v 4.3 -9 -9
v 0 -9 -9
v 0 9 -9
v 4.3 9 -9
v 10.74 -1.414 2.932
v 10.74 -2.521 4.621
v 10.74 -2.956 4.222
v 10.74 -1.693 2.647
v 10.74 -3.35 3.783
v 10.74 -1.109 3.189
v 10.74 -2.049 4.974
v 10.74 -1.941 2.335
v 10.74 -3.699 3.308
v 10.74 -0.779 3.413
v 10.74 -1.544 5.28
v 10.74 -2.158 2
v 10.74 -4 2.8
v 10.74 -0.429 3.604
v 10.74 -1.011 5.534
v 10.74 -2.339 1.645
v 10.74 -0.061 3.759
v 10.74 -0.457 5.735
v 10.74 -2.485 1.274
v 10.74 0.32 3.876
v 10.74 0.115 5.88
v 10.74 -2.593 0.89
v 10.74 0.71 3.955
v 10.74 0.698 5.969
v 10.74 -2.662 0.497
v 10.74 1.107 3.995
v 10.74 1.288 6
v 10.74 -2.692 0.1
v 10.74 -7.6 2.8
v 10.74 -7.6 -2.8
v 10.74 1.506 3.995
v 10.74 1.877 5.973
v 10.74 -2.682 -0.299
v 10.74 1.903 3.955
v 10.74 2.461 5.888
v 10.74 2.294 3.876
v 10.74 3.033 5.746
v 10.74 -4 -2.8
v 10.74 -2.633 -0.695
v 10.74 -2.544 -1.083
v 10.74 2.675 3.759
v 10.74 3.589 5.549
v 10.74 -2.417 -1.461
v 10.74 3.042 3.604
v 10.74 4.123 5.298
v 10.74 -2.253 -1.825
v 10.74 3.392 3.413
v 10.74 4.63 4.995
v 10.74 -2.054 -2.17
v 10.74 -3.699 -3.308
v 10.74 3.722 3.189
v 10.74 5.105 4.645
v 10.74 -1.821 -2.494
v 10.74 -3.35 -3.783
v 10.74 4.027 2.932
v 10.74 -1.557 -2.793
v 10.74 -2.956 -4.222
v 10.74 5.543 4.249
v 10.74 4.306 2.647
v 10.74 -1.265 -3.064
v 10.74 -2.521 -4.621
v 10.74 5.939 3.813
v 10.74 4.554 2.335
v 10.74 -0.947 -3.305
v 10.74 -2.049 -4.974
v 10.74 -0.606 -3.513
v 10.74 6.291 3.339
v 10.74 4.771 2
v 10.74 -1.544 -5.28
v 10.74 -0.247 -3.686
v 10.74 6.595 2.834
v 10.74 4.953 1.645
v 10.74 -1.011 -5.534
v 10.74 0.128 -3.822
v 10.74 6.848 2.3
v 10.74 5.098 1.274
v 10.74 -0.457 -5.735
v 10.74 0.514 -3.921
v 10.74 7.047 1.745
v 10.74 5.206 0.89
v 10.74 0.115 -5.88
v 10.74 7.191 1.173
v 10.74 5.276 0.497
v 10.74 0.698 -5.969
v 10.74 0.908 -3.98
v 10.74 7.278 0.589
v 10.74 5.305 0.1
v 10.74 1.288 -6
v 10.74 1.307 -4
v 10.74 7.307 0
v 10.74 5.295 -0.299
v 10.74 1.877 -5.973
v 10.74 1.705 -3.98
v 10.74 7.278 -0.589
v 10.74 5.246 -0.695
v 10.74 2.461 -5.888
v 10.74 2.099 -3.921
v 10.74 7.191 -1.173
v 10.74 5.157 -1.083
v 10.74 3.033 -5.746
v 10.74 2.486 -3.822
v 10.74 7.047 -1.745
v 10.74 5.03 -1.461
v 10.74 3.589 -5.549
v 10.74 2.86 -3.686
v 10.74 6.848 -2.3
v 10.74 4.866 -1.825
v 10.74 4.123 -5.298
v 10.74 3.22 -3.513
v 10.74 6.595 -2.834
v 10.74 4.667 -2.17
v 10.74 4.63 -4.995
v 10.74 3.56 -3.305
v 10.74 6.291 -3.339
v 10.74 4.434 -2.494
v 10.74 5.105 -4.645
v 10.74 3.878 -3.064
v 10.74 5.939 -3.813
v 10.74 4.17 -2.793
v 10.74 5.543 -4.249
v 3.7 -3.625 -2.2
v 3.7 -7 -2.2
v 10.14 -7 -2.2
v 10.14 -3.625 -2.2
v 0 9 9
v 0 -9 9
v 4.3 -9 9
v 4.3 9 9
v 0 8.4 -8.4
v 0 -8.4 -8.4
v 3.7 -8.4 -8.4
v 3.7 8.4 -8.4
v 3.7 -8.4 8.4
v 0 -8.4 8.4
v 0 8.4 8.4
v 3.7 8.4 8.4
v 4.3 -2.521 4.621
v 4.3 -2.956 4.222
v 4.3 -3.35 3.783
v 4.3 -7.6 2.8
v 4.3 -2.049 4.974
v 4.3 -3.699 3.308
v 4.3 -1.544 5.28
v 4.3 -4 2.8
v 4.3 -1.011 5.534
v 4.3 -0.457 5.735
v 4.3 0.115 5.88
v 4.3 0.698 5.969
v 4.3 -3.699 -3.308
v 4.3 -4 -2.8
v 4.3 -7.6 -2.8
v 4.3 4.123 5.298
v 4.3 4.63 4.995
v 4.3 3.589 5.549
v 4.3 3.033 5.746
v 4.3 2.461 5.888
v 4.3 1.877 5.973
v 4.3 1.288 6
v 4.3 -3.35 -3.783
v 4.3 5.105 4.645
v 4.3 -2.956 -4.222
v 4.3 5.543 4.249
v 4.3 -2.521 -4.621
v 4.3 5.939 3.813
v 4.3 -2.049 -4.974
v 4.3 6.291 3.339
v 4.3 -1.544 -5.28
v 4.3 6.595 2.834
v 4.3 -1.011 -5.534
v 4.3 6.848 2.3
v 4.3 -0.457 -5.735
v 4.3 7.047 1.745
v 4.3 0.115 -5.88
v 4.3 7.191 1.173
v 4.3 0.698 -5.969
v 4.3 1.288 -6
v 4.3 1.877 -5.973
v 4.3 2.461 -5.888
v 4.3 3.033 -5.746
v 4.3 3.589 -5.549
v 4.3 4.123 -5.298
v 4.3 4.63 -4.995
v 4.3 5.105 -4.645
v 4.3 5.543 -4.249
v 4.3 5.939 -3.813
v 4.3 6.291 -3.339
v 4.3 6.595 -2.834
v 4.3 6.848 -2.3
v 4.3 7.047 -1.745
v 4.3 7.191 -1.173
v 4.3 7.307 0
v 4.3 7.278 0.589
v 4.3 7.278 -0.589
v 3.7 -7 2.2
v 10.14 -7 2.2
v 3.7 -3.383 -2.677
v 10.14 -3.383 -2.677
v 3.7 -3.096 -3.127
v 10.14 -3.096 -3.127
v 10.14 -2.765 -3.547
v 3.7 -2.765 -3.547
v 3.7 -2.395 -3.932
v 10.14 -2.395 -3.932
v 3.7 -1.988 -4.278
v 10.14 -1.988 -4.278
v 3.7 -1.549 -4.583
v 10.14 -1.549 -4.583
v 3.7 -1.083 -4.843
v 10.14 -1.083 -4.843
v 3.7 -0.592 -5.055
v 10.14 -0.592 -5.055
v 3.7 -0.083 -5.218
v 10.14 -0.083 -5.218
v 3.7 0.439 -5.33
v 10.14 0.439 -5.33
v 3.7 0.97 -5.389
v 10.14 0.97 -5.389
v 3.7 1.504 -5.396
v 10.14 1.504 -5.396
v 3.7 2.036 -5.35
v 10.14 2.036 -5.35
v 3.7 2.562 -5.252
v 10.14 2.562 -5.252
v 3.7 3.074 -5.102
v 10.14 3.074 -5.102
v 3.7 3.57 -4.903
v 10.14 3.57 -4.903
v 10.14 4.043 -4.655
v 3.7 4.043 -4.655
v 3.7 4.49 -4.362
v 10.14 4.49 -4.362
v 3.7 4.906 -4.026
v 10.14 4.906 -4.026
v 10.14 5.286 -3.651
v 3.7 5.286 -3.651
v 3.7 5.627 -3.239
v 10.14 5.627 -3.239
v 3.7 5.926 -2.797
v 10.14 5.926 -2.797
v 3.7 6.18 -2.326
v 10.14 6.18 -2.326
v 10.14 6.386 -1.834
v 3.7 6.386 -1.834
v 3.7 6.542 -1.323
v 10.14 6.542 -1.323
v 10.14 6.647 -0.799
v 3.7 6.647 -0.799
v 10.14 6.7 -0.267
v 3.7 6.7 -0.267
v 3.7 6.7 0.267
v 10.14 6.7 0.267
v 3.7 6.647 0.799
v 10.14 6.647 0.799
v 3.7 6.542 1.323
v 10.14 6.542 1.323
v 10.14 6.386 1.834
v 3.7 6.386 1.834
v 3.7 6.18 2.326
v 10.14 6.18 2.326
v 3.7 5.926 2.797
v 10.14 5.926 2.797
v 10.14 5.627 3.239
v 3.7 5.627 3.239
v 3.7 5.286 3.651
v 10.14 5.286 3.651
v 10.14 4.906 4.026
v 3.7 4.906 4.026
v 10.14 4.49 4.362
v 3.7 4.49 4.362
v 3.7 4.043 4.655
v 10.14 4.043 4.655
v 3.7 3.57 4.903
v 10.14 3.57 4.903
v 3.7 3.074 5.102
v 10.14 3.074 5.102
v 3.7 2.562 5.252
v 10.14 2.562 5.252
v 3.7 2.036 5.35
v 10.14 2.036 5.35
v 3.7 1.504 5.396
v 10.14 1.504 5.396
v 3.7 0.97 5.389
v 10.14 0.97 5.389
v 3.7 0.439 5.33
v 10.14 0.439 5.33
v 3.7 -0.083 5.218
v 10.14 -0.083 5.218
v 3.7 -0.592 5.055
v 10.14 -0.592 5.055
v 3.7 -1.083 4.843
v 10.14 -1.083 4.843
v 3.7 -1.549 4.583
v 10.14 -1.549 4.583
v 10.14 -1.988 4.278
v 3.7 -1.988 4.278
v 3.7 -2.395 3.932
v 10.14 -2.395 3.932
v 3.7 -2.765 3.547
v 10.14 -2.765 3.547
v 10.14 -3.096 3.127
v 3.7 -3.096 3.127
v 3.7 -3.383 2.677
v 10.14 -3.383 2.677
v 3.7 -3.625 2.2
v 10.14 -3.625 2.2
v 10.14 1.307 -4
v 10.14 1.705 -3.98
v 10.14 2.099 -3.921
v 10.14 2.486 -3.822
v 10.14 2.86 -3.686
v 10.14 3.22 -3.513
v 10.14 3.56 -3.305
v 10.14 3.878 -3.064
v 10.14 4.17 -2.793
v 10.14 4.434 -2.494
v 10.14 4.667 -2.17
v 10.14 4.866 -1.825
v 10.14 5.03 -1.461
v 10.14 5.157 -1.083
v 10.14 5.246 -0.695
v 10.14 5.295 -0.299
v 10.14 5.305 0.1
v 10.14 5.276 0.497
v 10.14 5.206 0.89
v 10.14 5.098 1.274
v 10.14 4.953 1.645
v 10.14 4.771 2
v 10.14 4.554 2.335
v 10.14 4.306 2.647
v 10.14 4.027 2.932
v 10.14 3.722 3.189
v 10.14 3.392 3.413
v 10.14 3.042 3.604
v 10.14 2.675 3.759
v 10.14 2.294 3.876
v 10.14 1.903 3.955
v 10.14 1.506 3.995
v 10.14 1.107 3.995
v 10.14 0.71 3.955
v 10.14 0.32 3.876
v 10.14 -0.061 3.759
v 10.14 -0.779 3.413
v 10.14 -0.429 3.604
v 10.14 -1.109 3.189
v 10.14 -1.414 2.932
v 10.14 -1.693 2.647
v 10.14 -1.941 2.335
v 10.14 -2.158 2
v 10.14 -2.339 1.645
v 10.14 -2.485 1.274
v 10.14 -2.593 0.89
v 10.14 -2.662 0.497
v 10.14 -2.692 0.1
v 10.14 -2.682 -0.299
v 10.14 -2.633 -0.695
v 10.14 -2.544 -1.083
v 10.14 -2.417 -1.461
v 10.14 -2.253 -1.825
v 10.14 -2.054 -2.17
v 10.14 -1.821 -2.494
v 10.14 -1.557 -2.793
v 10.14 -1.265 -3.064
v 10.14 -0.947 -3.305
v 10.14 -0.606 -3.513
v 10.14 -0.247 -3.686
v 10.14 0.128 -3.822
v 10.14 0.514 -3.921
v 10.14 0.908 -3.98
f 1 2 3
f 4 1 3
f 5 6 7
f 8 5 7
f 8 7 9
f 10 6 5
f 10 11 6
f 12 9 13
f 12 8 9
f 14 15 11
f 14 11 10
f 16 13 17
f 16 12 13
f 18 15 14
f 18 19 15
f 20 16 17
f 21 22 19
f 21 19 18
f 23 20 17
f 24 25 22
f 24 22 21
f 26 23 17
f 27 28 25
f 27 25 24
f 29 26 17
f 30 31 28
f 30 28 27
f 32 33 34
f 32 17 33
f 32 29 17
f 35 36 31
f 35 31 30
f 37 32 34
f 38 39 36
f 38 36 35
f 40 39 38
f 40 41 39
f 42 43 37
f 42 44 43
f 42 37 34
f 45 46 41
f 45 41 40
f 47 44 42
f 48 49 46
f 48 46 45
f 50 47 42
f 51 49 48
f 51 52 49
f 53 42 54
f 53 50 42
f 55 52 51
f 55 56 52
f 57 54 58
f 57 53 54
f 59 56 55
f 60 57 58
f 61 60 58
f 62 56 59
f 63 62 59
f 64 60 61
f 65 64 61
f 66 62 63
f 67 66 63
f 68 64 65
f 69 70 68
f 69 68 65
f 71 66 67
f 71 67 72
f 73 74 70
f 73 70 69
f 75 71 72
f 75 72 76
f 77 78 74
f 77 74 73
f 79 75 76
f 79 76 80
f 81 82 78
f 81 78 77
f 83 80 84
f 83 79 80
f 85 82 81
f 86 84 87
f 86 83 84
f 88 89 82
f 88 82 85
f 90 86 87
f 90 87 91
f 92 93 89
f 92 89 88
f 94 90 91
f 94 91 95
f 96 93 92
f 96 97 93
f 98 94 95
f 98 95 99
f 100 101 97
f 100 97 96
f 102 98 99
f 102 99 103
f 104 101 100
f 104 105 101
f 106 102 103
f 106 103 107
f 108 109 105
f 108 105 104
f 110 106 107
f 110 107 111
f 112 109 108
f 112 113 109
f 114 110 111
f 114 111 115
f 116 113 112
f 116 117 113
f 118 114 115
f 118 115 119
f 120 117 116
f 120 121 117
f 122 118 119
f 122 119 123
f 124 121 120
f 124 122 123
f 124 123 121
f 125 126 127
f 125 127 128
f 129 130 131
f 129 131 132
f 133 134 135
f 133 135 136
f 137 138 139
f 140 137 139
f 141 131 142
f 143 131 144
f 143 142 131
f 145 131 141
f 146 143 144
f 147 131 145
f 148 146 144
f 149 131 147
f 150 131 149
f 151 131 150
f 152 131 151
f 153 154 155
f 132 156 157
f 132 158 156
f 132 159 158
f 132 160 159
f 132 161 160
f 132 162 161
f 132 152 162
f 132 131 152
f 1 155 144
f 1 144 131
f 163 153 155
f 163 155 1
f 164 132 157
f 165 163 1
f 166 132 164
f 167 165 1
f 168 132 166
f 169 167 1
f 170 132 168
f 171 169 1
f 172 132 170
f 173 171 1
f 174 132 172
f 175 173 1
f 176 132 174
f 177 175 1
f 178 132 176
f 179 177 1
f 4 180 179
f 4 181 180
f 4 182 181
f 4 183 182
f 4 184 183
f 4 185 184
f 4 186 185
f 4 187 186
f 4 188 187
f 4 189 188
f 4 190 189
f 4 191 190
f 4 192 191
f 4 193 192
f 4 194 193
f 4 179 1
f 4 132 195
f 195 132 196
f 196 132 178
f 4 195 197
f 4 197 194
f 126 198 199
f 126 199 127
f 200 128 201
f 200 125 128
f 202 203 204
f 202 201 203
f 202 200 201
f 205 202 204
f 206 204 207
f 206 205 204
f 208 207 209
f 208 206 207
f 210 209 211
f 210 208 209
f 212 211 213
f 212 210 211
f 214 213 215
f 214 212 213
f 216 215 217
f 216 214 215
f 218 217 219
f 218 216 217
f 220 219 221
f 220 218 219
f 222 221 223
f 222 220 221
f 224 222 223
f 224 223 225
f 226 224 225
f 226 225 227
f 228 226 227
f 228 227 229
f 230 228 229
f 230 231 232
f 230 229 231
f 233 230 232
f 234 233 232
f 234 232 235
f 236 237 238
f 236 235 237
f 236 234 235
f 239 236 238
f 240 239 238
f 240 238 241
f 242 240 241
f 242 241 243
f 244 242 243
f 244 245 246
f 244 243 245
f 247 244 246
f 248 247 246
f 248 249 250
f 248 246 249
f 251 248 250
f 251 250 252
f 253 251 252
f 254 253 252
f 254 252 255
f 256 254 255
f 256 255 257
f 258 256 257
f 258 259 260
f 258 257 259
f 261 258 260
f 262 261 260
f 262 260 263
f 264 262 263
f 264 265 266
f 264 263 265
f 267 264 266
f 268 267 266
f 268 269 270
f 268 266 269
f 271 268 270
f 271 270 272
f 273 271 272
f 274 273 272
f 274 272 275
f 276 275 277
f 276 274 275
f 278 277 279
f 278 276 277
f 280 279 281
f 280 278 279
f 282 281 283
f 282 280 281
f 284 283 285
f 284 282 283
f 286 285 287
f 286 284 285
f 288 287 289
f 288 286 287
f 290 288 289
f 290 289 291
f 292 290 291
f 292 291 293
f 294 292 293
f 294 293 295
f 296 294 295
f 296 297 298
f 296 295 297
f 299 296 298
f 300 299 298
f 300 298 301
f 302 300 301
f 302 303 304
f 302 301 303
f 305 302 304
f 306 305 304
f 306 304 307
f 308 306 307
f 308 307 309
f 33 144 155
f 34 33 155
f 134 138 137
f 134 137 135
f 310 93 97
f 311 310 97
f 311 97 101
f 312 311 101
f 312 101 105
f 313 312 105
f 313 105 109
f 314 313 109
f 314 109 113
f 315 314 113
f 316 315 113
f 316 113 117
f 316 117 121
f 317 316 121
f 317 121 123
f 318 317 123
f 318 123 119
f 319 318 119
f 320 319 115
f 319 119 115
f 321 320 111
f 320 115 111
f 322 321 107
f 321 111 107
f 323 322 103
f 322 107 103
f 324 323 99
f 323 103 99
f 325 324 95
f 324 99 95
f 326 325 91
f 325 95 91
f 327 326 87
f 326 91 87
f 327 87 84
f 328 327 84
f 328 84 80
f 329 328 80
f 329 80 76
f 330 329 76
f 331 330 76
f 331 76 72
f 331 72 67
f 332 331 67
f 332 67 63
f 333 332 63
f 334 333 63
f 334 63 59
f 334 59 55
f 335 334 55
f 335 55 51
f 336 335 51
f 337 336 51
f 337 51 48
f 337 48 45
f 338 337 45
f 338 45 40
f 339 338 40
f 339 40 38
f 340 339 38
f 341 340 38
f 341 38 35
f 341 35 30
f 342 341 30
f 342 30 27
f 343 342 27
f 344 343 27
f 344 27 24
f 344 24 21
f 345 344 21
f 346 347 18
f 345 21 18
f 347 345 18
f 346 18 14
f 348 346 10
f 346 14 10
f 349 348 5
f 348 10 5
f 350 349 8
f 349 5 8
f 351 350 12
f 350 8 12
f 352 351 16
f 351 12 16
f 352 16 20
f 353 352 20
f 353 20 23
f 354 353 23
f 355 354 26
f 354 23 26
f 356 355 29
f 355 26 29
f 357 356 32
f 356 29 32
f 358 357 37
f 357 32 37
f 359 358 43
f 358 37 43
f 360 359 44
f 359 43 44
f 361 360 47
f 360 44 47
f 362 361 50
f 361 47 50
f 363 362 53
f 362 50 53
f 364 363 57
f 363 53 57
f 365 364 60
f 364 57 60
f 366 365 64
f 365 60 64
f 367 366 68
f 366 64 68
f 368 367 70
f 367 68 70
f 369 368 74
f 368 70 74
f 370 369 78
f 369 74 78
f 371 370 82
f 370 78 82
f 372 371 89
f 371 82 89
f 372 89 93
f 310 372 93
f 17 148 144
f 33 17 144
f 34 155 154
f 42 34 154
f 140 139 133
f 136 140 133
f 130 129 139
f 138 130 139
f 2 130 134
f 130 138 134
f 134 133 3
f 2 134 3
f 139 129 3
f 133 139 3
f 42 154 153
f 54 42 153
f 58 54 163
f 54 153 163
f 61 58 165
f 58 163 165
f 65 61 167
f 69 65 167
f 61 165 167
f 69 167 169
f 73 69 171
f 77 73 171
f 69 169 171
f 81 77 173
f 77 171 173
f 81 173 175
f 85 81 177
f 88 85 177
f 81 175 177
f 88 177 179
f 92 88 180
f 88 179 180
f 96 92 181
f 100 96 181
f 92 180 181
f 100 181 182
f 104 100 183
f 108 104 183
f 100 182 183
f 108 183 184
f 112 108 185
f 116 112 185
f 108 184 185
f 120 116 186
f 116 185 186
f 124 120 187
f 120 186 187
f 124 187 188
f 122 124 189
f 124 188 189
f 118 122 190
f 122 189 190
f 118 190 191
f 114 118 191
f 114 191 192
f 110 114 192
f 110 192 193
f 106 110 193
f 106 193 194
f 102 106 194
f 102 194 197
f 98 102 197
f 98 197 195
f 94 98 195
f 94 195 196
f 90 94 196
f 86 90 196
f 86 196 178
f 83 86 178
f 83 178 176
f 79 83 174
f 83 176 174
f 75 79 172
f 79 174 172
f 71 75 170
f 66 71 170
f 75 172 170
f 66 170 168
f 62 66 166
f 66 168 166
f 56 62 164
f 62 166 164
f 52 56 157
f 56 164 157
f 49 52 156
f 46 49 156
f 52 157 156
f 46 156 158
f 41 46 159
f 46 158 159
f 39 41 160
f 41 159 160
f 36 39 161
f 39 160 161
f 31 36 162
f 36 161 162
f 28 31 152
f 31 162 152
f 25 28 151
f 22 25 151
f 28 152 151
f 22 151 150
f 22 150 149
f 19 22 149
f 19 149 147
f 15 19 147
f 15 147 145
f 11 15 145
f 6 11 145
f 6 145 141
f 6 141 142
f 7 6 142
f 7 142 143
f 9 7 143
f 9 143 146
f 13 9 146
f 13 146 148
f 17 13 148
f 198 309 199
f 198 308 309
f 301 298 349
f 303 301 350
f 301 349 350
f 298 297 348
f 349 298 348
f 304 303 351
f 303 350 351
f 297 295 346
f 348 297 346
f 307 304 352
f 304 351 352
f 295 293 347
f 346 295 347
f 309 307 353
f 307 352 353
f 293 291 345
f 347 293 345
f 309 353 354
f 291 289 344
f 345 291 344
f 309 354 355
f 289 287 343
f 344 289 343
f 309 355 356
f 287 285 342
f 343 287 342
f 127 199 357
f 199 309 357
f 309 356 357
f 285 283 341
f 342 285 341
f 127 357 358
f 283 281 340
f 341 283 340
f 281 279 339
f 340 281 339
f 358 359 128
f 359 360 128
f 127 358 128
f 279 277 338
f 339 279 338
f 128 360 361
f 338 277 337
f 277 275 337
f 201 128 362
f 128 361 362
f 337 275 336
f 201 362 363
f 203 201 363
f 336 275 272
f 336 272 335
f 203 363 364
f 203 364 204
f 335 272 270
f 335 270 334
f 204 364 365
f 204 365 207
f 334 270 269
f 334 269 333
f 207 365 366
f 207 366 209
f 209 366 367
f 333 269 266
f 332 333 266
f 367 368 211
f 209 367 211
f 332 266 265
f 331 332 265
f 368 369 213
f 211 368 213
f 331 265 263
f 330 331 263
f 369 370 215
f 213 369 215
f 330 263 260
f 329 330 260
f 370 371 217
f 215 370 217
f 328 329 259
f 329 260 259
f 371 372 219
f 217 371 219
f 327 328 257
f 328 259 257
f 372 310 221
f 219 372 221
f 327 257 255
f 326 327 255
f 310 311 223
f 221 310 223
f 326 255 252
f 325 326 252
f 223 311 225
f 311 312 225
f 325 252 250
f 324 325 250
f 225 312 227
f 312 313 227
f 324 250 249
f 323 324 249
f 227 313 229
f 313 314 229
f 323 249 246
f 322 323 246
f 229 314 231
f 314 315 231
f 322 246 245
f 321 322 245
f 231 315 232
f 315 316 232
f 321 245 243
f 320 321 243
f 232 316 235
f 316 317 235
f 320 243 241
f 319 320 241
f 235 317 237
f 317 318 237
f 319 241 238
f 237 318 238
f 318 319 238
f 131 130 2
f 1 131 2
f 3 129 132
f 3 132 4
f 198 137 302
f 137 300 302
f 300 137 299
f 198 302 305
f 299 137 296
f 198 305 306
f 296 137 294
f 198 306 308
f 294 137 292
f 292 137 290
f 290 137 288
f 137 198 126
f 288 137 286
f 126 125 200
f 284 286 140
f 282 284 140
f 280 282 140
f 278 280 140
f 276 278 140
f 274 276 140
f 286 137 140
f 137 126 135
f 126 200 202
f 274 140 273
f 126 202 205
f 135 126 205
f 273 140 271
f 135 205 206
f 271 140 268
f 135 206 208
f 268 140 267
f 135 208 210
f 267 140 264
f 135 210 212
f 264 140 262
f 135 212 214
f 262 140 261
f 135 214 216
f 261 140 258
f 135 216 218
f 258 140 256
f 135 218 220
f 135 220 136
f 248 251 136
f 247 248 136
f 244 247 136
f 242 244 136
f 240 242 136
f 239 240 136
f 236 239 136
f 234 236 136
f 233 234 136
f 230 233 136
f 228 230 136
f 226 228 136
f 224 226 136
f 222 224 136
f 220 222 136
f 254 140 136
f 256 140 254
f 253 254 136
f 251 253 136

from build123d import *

# Parameters (mm, degrees)
SKETCH2_W           = 18
SKETCH2_H           = 18
BOSS_EXTRUDE1_DEPTH = 4.3
BOSS_EXTRUDE2_DEPTH = 6.44
SHELL2_T            = -0.6
SKETCH5_R           = 4
CUT_EXTRUDE1_DEPTH  = 17.653756333


with BuildPart() as part:
    # Sketch2 → Boss-Extrude1 (new body)
    with BuildSketch(Plane(origin=(0, 0, 0), x_dir=(0, 0, -1), z_dir=(1, 0, 0))):
        Rectangle(SKETCH2_W, SKETCH2_H)
    extrude(amount=BOSS_EXTRUDE1_DEPTH)

    # Sketch4 → Boss-Extrude2 (add)
    with BuildSketch(Plane(origin=(4.3, 0, 0), x_dir=(0, 0, -1), z_dir=(1, 0, 0))):
        with BuildLine():
            Line((-2.8, -7.6), (2.8, -7.6))
            Line((2.8, -7.6), (2.8, -4))
            ThreePointArc((2.8, -4), (0, 7.306599665), (-2.8, -4))
            Line((-2.8, -4), (-2.8, -7.6))
        make_face()
    extrude(amount=BOSS_EXTRUDE2_DEPTH)

    # Shell2
    shell2_openings = [part.faces().sort_by_distance(p)[0] for p in [
        (0, 0, 0),
    ]]
    offset(amount=SHELL2_T, openings=shell2_openings, kind=Kind.INTERSECTION)

    # Sketch5 → Cut-Extrude1 (cut, through all)
    with BuildSketch(Plane(origin=(10.74, 0, 0), x_dir=(0, 0, -1), z_dir=(1, 0, 0))):
        with Locations((0, 1.306599665)):
            Circle(SKETCH5_R)
    extrude(amount=-CUT_EXTRUDE1_DEPTH, mode=Mode.SUBTRACT)


solid = part.part
